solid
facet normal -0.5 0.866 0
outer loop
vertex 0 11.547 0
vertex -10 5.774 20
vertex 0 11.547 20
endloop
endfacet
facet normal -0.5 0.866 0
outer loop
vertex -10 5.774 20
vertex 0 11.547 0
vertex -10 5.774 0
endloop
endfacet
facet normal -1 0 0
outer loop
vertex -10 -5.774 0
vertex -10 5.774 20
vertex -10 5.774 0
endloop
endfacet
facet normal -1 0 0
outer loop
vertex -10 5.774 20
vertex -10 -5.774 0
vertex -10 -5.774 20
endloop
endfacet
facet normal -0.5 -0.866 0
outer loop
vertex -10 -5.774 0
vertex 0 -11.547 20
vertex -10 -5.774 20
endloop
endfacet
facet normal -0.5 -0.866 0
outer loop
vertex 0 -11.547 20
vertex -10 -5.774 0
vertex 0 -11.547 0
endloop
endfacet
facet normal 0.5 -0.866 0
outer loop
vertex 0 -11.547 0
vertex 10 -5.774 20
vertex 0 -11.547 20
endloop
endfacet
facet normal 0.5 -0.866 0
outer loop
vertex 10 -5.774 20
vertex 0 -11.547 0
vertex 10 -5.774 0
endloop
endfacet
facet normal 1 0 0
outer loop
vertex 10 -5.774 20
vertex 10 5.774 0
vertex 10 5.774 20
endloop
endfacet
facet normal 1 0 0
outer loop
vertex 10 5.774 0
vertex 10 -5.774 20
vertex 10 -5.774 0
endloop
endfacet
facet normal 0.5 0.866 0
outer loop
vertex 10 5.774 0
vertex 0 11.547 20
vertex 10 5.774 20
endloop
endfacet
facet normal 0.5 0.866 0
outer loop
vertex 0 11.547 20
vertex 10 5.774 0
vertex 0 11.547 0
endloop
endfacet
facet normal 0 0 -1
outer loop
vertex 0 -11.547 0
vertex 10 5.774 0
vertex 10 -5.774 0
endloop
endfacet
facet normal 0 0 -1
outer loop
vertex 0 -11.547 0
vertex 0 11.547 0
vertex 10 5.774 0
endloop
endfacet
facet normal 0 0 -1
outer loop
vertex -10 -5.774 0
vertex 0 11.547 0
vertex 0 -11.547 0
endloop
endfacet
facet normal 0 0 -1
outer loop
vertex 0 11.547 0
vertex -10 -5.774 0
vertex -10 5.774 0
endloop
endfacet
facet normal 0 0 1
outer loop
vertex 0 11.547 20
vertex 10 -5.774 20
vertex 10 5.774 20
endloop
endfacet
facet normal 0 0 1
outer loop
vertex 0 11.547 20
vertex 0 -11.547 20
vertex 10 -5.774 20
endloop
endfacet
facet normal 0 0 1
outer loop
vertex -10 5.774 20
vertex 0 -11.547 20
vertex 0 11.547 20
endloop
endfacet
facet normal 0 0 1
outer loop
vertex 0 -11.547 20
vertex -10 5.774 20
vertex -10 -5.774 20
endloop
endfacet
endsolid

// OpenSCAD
// file: triangle.scad
// Nathanael Lane
// 2015.1.22


/*
 * -h: height of prism
 * -b: length of base
 * -d: base-to-apex distance
 * -s: side length
 * -a: angle of apex corner
 * -if more than two of b, d, s, and a are defined, the outcome is undefined
 */
module _triangle(b = 0, d = 0, s = 0, a = 0, base_origin = false){
	
	adBase = tan(a / 2) * d * 2;
	asBase = sin(a / 2) * s * 2;
	dsBase = sqrt((s * s) - (d * d));
	abHeight = (b / 2) / tan(a / 2);
	asHeight = cos(a / 2) * s;
	bsHeight = sqrt((s * s) - (b * b));

	baseLUT = [b, asBase, b, adBase, b, dsBase];
	heightLUT = [abHeight, asHeight, bsHeight, d, d, d];

	base = baseLUT[
		min((sign(b) + sign(s) * 2 + sign(d) * 4) - 1, 5)
	];
	height = heightLUT[
		min((sign(b) + sign(s) * 2 + sign(d) * 4) - 1, 5)
	];

	translate([0, base_origin ? height : 0, 0])
			polygon([
				[0, 0], 
				[base / 2, -height], 
				[-base / 2, -height]
			]);	
}

module triangle(h = 1, b = 0, d = 0, s = 0, a = 0, base_origin = false, center = false){

	translate([0, 0, center ? -h /2 : 0])
		linear_extrude(height = h)
			_triangle(b = b, d = d, s = s, a = a, base_origin = base_origin);	
}


$fa = 5;
$fs = 0.05;

triangle(h = 3, b = 10, a = 60, baseOrigin = true, center = true);
// main file
// Nathanael Lane
// 2015.1.22

use <triangle.scad>

/*
 * -r: radius (measured from center to flat, not center to corner)
 * -d: diameter (if both radius and diameter are specified, the used variable is undefined)
 * -ns: desired number of sides
 * -sl: desired minimum side length
 * -h: height of resulting prism
 * -center: whether or not to center resulting prism
 */
module regular_polygon(r = 0, d = 1, ns = 6, sl = 0.01, h = 1, center = false){
	
	function vo(r, fa) = r / cos(fa / 2);
	
	function fa(ns, r) = (ns > 3) && (sqrt(pow(vo(r = r, fa = 360 / ns), 2) - r * r) < sl / 2) ? 
		fa(ns = ns - 1, r = r) : 
		360 / ns;
	
	rd = (r == 0) ? d / 2 : r;
	
	a = fa(ns = ns, r = rd);
	
	vr = vo(r = rd, fa = a);

	if(a > 72){
	
		if(a > 90){
		
			translate([0, rd * 2, 0]){
			
				triangle(a = 60, d = rd * 3, h = h, center = center);
			}
		}else{
		
			rotate([0, 0, 45]){
			
				translate([0, 0, center ? 0 : h / 2]){
				
					cube([rd * 2, rd * 2, h], center = true);
				}
			}
		}
	}else{
	
		rotate([0, 0, 90]){
		
			cylinder(r = vr, h = h, center = center, $fa = a, $fs = sl);
		}
	}
}

regular_polygon(r = 10, h = 20);
